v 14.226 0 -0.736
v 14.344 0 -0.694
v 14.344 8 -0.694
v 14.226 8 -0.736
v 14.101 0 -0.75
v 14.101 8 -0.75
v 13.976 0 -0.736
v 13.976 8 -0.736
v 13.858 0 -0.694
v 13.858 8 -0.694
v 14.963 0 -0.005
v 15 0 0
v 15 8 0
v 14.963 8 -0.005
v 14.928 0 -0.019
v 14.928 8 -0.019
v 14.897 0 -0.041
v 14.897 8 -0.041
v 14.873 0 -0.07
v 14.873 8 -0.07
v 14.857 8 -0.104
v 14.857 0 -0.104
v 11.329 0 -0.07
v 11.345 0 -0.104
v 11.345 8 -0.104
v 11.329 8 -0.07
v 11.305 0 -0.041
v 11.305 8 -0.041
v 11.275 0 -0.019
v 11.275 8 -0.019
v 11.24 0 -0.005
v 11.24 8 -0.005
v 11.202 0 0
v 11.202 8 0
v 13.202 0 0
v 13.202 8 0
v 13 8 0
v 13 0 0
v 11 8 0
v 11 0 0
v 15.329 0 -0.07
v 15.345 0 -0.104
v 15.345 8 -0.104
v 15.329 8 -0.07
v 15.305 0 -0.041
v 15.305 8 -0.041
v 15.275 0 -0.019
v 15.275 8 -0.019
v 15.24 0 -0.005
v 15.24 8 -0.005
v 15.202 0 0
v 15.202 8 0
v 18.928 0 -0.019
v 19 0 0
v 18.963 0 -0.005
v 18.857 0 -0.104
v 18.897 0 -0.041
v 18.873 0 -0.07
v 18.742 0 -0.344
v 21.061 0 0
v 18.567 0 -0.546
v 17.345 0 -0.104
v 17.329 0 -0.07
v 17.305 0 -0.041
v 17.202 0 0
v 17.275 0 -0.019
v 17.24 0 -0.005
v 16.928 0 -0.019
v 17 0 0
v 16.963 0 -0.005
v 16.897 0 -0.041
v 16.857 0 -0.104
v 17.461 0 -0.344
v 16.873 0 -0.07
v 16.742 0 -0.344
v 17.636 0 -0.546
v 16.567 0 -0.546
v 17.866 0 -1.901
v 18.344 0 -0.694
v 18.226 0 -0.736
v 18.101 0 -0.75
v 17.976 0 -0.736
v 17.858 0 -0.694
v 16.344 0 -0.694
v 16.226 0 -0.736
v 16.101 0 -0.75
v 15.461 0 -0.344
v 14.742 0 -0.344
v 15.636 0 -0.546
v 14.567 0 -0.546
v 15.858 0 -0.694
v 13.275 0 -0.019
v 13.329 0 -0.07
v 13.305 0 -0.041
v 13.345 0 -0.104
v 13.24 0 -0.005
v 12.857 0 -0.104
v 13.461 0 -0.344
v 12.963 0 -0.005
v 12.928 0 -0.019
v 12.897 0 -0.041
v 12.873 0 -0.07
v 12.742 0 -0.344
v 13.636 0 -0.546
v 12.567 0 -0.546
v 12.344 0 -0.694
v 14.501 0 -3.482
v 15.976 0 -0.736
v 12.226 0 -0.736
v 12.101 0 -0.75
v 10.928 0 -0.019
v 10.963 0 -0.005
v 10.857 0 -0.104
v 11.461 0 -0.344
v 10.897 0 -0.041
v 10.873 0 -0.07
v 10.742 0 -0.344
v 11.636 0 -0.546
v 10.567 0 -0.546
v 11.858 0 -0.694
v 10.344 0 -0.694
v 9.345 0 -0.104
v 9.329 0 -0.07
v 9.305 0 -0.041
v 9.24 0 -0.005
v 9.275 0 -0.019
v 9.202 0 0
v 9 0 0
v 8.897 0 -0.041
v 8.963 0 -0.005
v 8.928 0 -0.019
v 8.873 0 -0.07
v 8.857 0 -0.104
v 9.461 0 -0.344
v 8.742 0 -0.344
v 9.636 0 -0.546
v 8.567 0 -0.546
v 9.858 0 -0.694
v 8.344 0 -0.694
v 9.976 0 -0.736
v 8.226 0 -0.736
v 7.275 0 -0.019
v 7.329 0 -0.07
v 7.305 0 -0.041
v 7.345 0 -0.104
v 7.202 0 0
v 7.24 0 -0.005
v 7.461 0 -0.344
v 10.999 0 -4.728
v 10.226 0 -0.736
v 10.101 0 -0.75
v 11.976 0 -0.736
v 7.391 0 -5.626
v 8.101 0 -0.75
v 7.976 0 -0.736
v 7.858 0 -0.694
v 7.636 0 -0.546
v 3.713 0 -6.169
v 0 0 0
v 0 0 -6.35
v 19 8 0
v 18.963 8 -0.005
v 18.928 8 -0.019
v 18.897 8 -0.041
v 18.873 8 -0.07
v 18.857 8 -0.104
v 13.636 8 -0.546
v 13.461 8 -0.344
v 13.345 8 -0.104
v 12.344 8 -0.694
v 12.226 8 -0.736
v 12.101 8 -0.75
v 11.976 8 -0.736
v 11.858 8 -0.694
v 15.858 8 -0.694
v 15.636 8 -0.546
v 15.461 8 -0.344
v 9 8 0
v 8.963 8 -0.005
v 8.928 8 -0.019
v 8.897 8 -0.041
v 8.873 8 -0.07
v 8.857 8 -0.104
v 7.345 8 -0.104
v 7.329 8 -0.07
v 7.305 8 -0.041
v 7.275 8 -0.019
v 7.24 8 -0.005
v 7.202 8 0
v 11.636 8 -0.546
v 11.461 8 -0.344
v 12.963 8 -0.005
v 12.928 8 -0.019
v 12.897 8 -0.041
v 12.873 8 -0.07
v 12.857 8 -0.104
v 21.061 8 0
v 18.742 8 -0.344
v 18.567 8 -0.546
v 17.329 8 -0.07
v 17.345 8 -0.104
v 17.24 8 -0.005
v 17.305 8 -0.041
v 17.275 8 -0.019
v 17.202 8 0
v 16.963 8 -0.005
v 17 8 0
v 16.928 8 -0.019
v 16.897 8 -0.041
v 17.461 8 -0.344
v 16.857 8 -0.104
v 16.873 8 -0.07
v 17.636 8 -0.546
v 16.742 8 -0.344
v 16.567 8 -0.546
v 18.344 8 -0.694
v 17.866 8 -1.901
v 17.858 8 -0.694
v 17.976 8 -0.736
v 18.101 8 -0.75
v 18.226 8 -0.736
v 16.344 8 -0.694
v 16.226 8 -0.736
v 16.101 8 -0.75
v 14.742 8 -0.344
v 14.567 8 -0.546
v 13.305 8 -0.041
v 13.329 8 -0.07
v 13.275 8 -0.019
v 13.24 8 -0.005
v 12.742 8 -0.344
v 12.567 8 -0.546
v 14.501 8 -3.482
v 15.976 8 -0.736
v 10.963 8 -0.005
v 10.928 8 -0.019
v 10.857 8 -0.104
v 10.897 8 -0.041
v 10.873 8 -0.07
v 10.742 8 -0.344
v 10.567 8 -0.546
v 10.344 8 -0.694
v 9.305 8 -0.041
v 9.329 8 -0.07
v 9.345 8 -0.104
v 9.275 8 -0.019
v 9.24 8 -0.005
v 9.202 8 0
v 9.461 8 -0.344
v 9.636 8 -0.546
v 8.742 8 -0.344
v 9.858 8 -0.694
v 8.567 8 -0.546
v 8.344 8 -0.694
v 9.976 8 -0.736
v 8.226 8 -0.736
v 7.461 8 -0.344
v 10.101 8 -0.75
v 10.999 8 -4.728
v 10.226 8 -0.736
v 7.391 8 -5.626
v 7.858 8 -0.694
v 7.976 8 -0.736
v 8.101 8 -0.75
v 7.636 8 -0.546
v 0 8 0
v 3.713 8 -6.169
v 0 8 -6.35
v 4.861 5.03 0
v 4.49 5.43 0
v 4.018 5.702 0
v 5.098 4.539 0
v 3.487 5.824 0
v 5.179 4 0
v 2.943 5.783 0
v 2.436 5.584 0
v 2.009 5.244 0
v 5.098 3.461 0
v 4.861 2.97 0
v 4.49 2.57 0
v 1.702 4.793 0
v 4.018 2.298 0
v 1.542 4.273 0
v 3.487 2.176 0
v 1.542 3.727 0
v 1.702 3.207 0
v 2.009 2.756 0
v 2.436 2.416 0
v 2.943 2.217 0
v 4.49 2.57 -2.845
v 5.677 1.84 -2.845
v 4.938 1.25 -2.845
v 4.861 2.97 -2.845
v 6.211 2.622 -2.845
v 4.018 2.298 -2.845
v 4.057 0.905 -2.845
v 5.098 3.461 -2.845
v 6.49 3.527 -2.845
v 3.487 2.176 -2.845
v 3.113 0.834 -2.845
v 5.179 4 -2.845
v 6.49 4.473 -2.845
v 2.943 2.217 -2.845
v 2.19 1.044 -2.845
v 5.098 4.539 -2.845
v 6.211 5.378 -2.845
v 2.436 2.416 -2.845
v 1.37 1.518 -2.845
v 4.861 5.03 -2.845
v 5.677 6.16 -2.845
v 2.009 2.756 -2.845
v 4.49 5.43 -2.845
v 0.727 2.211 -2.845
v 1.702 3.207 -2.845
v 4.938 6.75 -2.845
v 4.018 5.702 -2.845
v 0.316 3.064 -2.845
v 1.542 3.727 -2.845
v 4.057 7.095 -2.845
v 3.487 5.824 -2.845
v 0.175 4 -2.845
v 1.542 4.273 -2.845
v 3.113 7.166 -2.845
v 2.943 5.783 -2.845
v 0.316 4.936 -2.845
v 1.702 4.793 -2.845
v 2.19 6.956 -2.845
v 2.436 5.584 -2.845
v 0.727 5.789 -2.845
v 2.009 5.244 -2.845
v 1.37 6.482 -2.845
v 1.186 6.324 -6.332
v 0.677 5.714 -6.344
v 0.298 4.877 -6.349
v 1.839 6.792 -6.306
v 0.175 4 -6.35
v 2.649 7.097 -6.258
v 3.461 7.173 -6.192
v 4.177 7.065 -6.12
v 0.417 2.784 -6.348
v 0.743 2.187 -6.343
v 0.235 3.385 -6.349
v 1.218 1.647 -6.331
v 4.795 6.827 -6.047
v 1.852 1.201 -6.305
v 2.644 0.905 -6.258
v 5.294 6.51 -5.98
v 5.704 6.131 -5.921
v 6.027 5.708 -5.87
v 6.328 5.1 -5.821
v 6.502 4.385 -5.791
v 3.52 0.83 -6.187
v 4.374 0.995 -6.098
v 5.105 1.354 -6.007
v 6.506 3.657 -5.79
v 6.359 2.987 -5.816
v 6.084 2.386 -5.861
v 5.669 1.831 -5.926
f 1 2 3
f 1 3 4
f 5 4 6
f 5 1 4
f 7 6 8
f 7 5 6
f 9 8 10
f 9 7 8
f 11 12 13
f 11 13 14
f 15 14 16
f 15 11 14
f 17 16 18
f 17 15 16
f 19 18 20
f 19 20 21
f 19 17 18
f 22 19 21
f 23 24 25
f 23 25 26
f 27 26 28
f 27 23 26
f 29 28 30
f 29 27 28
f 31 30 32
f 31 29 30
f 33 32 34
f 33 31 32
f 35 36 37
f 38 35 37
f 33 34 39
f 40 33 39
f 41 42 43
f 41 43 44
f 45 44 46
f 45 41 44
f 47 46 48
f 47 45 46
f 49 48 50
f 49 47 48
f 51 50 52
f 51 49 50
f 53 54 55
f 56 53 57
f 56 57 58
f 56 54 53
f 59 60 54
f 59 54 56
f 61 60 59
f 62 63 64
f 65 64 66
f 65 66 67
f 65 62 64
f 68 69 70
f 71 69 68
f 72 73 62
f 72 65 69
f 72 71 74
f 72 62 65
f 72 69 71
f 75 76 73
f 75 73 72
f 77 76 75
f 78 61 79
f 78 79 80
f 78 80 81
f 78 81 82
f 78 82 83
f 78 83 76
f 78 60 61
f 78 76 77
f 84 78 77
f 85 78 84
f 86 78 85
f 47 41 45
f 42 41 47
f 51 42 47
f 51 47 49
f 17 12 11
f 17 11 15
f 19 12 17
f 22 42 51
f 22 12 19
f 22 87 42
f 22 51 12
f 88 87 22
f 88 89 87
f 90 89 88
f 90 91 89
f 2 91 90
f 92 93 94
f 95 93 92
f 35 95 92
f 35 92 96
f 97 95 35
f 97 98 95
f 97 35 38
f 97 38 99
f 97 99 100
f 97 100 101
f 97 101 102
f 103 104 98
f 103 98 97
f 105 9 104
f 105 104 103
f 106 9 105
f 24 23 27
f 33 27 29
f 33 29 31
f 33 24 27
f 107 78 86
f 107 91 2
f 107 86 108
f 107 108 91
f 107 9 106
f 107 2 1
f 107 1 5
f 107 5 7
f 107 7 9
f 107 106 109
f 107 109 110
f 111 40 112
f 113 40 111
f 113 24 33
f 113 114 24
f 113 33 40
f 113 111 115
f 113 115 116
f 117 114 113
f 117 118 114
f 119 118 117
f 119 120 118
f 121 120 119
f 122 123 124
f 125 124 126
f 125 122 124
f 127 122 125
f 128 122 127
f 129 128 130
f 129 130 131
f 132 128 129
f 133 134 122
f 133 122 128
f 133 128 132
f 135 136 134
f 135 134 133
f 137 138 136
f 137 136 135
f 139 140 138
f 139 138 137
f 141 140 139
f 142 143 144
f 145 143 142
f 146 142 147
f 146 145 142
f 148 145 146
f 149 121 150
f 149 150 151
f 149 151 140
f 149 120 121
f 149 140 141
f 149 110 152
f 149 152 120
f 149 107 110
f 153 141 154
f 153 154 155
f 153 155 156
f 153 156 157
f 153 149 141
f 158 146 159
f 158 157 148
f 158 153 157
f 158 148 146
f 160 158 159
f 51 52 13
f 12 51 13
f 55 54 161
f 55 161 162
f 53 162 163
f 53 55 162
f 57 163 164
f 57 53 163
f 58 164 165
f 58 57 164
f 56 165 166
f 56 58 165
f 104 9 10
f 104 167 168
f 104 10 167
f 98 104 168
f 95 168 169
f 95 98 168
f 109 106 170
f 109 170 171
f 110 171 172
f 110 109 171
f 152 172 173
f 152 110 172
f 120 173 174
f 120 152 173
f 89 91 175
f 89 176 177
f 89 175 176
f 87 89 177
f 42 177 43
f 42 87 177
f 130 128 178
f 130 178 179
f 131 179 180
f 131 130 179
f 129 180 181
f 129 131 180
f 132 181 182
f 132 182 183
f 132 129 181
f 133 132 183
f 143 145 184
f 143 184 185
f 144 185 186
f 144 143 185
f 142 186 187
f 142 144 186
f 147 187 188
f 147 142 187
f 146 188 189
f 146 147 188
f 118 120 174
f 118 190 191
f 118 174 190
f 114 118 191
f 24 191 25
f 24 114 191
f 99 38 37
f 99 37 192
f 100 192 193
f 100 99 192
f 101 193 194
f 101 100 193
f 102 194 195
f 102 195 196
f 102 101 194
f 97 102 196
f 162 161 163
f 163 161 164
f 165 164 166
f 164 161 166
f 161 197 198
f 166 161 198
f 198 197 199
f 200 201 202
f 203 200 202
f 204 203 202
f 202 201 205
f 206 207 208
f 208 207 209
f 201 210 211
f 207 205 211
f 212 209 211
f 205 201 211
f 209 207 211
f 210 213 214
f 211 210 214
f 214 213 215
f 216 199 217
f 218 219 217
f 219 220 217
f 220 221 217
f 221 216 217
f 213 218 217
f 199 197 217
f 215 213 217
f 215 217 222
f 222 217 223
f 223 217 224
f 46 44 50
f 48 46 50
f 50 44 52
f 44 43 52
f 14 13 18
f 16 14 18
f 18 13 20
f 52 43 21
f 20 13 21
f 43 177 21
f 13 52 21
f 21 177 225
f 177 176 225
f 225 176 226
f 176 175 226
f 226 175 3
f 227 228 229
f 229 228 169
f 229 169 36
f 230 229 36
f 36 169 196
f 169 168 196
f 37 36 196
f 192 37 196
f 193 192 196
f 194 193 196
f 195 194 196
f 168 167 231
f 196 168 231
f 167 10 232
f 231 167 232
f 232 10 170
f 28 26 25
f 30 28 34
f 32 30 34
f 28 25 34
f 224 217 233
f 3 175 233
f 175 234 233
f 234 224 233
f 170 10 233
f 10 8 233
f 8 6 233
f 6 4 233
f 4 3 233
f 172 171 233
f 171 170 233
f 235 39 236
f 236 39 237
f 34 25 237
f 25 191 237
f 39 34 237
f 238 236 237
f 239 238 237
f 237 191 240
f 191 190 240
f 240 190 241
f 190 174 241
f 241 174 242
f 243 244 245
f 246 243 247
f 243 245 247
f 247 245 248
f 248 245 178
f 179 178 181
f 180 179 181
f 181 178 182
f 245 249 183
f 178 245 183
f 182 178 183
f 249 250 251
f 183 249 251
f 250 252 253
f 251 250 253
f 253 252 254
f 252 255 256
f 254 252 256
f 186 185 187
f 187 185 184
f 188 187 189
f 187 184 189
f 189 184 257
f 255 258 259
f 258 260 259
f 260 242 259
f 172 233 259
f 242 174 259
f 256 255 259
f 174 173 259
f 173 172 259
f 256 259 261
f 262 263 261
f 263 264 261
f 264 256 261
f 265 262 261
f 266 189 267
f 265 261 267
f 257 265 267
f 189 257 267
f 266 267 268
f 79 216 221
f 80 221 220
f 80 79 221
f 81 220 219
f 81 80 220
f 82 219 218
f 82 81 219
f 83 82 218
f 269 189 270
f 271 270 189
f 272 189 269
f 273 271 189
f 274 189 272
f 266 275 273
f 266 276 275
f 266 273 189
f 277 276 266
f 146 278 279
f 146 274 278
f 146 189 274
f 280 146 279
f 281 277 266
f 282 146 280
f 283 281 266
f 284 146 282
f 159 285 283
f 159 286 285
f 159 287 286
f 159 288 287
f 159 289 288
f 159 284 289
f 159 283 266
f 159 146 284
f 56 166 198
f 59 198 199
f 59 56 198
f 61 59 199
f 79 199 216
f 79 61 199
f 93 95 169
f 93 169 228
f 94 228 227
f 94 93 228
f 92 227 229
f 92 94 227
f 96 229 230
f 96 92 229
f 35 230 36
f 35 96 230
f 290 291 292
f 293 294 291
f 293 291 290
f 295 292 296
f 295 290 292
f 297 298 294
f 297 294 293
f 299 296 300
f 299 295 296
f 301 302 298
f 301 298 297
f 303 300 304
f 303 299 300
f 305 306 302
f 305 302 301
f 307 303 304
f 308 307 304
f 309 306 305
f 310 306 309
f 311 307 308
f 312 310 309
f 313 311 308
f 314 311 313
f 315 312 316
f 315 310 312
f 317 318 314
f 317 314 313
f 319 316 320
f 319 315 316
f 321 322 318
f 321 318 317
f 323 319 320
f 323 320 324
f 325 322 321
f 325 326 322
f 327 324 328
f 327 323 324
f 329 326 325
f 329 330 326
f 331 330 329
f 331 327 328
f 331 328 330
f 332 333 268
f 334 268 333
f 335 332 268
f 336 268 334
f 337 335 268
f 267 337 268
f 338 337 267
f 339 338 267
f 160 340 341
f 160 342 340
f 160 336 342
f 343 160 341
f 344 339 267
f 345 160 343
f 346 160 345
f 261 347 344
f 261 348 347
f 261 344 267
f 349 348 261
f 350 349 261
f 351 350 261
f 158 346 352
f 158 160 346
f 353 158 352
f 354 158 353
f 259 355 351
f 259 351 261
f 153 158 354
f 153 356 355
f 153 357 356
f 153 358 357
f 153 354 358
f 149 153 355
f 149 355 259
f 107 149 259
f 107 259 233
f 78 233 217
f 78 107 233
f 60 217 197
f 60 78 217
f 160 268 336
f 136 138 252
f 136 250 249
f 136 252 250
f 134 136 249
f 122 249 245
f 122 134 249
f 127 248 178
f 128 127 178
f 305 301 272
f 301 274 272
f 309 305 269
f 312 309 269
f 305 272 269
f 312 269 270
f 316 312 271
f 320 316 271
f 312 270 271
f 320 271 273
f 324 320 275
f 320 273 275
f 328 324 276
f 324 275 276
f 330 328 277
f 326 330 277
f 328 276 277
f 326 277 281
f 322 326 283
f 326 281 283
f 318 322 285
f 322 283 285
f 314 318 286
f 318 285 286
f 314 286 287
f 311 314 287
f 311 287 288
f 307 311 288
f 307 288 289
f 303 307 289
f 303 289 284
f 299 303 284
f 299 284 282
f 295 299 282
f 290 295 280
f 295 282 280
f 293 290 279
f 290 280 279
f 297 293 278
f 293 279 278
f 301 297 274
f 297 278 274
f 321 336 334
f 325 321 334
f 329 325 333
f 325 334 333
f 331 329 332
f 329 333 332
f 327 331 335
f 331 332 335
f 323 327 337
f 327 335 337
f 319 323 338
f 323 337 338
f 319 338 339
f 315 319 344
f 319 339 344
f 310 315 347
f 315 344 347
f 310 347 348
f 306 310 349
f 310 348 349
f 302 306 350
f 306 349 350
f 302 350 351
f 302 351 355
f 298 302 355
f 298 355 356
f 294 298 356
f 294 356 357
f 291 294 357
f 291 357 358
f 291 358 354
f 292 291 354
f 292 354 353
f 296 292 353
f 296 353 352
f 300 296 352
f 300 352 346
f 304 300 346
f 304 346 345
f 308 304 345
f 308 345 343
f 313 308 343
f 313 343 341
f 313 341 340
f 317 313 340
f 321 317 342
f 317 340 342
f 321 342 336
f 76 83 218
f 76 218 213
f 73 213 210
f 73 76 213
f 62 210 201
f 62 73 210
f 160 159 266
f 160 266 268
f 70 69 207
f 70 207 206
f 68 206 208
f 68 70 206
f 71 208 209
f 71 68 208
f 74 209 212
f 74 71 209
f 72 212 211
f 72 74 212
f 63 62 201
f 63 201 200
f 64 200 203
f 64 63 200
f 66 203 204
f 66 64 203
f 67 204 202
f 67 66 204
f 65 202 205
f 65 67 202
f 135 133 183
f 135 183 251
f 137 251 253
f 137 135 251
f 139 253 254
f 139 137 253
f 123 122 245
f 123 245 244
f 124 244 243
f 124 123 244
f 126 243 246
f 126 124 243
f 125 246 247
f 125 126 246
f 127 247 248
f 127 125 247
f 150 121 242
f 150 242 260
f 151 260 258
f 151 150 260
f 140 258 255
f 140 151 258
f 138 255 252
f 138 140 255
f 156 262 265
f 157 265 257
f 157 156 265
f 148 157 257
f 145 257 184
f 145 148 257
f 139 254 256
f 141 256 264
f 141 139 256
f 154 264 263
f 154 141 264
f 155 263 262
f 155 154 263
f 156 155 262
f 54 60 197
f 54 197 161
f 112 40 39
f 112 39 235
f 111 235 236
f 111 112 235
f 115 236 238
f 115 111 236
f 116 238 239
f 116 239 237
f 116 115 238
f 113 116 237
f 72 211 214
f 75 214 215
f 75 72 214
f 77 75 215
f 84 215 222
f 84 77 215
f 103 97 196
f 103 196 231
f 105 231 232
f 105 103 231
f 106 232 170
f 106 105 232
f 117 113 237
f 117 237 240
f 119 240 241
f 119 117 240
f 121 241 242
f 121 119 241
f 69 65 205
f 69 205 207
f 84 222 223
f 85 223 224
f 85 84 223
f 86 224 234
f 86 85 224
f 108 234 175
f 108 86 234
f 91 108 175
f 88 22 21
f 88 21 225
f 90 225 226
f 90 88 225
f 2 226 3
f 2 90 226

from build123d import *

# Parameters (mm, degrees)
BOSS_EXTRUDE1_DEPTH                            = 8
CBORE_FOR_6_SOCKET_HEAD_CAP_SCREW1_D           = 3.6576
CBORE_FOR_6_SOCKET_HEAD_CAP_SCREW1_CBORE_D     = 6.35
CBORE_FOR_6_SOCKET_HEAD_CAP_SCREW1_CBORE_DEPTH = 3.5052
CUT_EXTRUDE1_DEPTH                             = 9.0000001


with BuildPart() as part:
    # Sketch1 → Boss-Extrude1 (new body)
    with BuildSketch(Plane(origin=(0, 0, 0), x_dir=(1, 0, 0), z_dir=(0, 1, 0))):
        with BuildLine():
            Line((0, 0), (0, 6.35))
            ThreePointArc((0, 6.35), (10.998522628, 4.727972806), (21.060567419, 0))
            Line((21.060567419, 0), (0, 0))
        make_face()
    extrude(amount=BOSS_EXTRUDE1_DEPTH)

    # CBORE for #6 Socket Head Cap Screw1 (through all)
    with Locations(Plane(origin=(0, 0, -6.35), x_dir=(-1, 0, 0), z_dir=(0, 0, -1))):
        with Locations((-3.35, 4)):
            CounterBoreHole(CBORE_FOR_6_SOCKET_HEAD_CAP_SCREW1_D / 2, CBORE_FOR_6_SOCKET_HEAD_CAP_SCREW1_CBORE_D / 2, CBORE_FOR_6_SOCKET_HEAD_CAP_SCREW1_CBORE_DEPTH)

    # Sketch8 → Cut-Extrude1 (cut, through all)
    with BuildSketch(Plane.XZ):
        with BuildLine():
            Line((7.202330007, 0), (7, 0))
            Line((7, 0), (7, 1.396675329))
            Line((7, 1.396675329), (19, 1.396675329))
            Line((19, 1.396675329), (19, 0))
            ThreePointArc((19, 0), (18.911811713, -0.028662347), (18.85732587, -0.103695652))
            ThreePointArc((18.85732587, -0.103695652), (18.66092377, -0.451002442), (18.34436725, -0.693876404))
            ThreePointArc((18.34436725, -0.693876404), (18.101165003, -0.75), (17.857962756, -0.693876404))
            ThreePointArc((17.857962756, -0.693876404), (17.541406237, -0.451002442), (17.345004137, -0.103695652))
            ThreePointArc((17.345004137, -0.103695652), (17.290518293, -0.028662347), (17.202330007, 0))
            Line((17.202330007, 0), (17, 0))
            ThreePointArc((17, 0), (16.911811713, -0.028662347), (16.85732587, -0.103695652))
            ThreePointArc((16.85732587, -0.103695652), (16.66092377, -0.451002442), (16.34436725, -0.693876404))
            ThreePointArc((16.34436725, -0.693876404), (16.101165003, -0.75), (15.857962756, -0.693876404))
            ThreePointArc((15.857962756, -0.693876404), (15.541406237, -0.451002442), (15.345004137, -0.103695652))
            ThreePointArc((15.345004137, -0.103695652), (15.290518293, -0.028662347), (15.202330007, 0))
            Line((15.202330007, 0), (15, 0))
            ThreePointArc((15, 0), (14.911811713, -0.028662347), (14.85732587, -0.103695652))
            ThreePointArc((14.85732587, -0.103695652), (14.66092377, -0.451002442), (14.34436725, -0.693876404))
            ThreePointArc((14.34436725, -0.693876404), (14.101165003, -0.75), (13.857962756, -0.693876404))
            ThreePointArc((13.857962756, -0.693876404), (13.541406237, -0.451002442), (13.345004137, -0.103695652))
            ThreePointArc((13.345004137, -0.103695652), (13.290518293, -0.028662347), (13.202330007, 0))
            Line((13.202330007, 0), (13, 0))
            ThreePointArc((13, 0), (12.911811713, -0.028662347), (12.85732587, -0.103695652))
            ThreePointArc((12.85732587, -0.103695652), (12.66092377, -0.451002442), (12.34436725, -0.693876404))
            ThreePointArc((12.34436725, -0.693876404), (12.101165003, -0.75), (11.857962756, -0.693876404))
            ThreePointArc((11.857962756, -0.693876404), (11.541406237, -0.451002442), (11.345004137, -0.103695652))
            ThreePointArc((11.345004137, -0.103695652), (11.290518293, -0.028662347), (11.202330007, 0))
            Line((11.202330007, 0), (11, 0))
            ThreePointArc((11, 0), (10.911811713, -0.028662347), (10.85732587, -0.103695652))
            ThreePointArc((10.85732587, -0.103695652), (10.66092377, -0.451002442), (10.34436725, -0.693876404))
            ThreePointArc((10.34436725, -0.693876404), (10.101165003, -0.75), (9.857962756, -0.693876404))
            ThreePointArc((9.857962756, -0.693876404), (9.541406237, -0.451002442), (9.345004137, -0.103695652))
            ThreePointArc((9.345004137, -0.103695652), (9.290518293, -0.028662347), (9.202330007, 0))
            Line((9.202330007, 0), (9, 0))
            ThreePointArc((9, 0), (8.911811713, -0.028662347), (8.85732587, -0.103695652))
            ThreePointArc((8.85732587, -0.103695652), (8.66092377, -0.451002442), (8.34436725, -0.693876404))
            ThreePointArc((8.34436725, -0.693876404), (8.101165003, -0.75), (7.857962756, -0.693876404))
            ThreePointArc((7.857962756, -0.693876404), (7.541406237, -0.451002442), (7.345004137, -0.103695652))
            ThreePointArc((7.345004137, -0.103695652), (7.290518293, -0.028662347), (7.202330007, 0))
        make_face()
    extrude(amount=-CUT_EXTRUDE1_DEPTH, mode=Mode.SUBTRACT)


solid = part.part
